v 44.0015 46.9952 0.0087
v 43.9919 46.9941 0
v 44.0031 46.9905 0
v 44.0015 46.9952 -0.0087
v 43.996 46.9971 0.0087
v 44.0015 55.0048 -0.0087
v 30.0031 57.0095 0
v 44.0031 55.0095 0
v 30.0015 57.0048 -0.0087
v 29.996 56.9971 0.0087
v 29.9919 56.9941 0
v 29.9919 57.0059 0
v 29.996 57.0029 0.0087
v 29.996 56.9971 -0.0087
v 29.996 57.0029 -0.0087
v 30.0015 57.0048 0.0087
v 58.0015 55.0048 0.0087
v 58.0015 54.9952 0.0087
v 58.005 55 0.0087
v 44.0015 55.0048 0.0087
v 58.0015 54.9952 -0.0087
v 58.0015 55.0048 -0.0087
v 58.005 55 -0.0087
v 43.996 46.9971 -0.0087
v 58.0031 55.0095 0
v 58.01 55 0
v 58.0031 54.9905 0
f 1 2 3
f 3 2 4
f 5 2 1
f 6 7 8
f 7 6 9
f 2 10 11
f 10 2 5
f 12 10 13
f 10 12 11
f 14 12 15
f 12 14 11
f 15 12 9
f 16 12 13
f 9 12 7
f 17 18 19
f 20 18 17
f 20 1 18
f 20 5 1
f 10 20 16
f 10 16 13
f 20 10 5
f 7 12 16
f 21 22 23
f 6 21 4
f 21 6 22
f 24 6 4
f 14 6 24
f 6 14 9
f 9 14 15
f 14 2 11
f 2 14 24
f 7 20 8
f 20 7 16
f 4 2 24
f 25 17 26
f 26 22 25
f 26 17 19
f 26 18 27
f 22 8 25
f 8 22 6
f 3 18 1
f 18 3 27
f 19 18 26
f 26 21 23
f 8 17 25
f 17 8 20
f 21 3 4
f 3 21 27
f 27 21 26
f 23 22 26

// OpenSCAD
color([0.4243802848447257,0.563146297143221,0.7440353063269388]) hull(){
    translate([44,55]) sphere(0.01);
    translate([44,47]) sphere(0.01);
    translate([30,57]) sphere(0.01);
}
color([0.9127802346817413,0.7328405030530553,0.5302287321284004]) hull(){
    translate([44,55]) sphere(0.01);
    translate([44,47]) sphere(0.01);
    translate([58,55]) sphere(0.01);
}
